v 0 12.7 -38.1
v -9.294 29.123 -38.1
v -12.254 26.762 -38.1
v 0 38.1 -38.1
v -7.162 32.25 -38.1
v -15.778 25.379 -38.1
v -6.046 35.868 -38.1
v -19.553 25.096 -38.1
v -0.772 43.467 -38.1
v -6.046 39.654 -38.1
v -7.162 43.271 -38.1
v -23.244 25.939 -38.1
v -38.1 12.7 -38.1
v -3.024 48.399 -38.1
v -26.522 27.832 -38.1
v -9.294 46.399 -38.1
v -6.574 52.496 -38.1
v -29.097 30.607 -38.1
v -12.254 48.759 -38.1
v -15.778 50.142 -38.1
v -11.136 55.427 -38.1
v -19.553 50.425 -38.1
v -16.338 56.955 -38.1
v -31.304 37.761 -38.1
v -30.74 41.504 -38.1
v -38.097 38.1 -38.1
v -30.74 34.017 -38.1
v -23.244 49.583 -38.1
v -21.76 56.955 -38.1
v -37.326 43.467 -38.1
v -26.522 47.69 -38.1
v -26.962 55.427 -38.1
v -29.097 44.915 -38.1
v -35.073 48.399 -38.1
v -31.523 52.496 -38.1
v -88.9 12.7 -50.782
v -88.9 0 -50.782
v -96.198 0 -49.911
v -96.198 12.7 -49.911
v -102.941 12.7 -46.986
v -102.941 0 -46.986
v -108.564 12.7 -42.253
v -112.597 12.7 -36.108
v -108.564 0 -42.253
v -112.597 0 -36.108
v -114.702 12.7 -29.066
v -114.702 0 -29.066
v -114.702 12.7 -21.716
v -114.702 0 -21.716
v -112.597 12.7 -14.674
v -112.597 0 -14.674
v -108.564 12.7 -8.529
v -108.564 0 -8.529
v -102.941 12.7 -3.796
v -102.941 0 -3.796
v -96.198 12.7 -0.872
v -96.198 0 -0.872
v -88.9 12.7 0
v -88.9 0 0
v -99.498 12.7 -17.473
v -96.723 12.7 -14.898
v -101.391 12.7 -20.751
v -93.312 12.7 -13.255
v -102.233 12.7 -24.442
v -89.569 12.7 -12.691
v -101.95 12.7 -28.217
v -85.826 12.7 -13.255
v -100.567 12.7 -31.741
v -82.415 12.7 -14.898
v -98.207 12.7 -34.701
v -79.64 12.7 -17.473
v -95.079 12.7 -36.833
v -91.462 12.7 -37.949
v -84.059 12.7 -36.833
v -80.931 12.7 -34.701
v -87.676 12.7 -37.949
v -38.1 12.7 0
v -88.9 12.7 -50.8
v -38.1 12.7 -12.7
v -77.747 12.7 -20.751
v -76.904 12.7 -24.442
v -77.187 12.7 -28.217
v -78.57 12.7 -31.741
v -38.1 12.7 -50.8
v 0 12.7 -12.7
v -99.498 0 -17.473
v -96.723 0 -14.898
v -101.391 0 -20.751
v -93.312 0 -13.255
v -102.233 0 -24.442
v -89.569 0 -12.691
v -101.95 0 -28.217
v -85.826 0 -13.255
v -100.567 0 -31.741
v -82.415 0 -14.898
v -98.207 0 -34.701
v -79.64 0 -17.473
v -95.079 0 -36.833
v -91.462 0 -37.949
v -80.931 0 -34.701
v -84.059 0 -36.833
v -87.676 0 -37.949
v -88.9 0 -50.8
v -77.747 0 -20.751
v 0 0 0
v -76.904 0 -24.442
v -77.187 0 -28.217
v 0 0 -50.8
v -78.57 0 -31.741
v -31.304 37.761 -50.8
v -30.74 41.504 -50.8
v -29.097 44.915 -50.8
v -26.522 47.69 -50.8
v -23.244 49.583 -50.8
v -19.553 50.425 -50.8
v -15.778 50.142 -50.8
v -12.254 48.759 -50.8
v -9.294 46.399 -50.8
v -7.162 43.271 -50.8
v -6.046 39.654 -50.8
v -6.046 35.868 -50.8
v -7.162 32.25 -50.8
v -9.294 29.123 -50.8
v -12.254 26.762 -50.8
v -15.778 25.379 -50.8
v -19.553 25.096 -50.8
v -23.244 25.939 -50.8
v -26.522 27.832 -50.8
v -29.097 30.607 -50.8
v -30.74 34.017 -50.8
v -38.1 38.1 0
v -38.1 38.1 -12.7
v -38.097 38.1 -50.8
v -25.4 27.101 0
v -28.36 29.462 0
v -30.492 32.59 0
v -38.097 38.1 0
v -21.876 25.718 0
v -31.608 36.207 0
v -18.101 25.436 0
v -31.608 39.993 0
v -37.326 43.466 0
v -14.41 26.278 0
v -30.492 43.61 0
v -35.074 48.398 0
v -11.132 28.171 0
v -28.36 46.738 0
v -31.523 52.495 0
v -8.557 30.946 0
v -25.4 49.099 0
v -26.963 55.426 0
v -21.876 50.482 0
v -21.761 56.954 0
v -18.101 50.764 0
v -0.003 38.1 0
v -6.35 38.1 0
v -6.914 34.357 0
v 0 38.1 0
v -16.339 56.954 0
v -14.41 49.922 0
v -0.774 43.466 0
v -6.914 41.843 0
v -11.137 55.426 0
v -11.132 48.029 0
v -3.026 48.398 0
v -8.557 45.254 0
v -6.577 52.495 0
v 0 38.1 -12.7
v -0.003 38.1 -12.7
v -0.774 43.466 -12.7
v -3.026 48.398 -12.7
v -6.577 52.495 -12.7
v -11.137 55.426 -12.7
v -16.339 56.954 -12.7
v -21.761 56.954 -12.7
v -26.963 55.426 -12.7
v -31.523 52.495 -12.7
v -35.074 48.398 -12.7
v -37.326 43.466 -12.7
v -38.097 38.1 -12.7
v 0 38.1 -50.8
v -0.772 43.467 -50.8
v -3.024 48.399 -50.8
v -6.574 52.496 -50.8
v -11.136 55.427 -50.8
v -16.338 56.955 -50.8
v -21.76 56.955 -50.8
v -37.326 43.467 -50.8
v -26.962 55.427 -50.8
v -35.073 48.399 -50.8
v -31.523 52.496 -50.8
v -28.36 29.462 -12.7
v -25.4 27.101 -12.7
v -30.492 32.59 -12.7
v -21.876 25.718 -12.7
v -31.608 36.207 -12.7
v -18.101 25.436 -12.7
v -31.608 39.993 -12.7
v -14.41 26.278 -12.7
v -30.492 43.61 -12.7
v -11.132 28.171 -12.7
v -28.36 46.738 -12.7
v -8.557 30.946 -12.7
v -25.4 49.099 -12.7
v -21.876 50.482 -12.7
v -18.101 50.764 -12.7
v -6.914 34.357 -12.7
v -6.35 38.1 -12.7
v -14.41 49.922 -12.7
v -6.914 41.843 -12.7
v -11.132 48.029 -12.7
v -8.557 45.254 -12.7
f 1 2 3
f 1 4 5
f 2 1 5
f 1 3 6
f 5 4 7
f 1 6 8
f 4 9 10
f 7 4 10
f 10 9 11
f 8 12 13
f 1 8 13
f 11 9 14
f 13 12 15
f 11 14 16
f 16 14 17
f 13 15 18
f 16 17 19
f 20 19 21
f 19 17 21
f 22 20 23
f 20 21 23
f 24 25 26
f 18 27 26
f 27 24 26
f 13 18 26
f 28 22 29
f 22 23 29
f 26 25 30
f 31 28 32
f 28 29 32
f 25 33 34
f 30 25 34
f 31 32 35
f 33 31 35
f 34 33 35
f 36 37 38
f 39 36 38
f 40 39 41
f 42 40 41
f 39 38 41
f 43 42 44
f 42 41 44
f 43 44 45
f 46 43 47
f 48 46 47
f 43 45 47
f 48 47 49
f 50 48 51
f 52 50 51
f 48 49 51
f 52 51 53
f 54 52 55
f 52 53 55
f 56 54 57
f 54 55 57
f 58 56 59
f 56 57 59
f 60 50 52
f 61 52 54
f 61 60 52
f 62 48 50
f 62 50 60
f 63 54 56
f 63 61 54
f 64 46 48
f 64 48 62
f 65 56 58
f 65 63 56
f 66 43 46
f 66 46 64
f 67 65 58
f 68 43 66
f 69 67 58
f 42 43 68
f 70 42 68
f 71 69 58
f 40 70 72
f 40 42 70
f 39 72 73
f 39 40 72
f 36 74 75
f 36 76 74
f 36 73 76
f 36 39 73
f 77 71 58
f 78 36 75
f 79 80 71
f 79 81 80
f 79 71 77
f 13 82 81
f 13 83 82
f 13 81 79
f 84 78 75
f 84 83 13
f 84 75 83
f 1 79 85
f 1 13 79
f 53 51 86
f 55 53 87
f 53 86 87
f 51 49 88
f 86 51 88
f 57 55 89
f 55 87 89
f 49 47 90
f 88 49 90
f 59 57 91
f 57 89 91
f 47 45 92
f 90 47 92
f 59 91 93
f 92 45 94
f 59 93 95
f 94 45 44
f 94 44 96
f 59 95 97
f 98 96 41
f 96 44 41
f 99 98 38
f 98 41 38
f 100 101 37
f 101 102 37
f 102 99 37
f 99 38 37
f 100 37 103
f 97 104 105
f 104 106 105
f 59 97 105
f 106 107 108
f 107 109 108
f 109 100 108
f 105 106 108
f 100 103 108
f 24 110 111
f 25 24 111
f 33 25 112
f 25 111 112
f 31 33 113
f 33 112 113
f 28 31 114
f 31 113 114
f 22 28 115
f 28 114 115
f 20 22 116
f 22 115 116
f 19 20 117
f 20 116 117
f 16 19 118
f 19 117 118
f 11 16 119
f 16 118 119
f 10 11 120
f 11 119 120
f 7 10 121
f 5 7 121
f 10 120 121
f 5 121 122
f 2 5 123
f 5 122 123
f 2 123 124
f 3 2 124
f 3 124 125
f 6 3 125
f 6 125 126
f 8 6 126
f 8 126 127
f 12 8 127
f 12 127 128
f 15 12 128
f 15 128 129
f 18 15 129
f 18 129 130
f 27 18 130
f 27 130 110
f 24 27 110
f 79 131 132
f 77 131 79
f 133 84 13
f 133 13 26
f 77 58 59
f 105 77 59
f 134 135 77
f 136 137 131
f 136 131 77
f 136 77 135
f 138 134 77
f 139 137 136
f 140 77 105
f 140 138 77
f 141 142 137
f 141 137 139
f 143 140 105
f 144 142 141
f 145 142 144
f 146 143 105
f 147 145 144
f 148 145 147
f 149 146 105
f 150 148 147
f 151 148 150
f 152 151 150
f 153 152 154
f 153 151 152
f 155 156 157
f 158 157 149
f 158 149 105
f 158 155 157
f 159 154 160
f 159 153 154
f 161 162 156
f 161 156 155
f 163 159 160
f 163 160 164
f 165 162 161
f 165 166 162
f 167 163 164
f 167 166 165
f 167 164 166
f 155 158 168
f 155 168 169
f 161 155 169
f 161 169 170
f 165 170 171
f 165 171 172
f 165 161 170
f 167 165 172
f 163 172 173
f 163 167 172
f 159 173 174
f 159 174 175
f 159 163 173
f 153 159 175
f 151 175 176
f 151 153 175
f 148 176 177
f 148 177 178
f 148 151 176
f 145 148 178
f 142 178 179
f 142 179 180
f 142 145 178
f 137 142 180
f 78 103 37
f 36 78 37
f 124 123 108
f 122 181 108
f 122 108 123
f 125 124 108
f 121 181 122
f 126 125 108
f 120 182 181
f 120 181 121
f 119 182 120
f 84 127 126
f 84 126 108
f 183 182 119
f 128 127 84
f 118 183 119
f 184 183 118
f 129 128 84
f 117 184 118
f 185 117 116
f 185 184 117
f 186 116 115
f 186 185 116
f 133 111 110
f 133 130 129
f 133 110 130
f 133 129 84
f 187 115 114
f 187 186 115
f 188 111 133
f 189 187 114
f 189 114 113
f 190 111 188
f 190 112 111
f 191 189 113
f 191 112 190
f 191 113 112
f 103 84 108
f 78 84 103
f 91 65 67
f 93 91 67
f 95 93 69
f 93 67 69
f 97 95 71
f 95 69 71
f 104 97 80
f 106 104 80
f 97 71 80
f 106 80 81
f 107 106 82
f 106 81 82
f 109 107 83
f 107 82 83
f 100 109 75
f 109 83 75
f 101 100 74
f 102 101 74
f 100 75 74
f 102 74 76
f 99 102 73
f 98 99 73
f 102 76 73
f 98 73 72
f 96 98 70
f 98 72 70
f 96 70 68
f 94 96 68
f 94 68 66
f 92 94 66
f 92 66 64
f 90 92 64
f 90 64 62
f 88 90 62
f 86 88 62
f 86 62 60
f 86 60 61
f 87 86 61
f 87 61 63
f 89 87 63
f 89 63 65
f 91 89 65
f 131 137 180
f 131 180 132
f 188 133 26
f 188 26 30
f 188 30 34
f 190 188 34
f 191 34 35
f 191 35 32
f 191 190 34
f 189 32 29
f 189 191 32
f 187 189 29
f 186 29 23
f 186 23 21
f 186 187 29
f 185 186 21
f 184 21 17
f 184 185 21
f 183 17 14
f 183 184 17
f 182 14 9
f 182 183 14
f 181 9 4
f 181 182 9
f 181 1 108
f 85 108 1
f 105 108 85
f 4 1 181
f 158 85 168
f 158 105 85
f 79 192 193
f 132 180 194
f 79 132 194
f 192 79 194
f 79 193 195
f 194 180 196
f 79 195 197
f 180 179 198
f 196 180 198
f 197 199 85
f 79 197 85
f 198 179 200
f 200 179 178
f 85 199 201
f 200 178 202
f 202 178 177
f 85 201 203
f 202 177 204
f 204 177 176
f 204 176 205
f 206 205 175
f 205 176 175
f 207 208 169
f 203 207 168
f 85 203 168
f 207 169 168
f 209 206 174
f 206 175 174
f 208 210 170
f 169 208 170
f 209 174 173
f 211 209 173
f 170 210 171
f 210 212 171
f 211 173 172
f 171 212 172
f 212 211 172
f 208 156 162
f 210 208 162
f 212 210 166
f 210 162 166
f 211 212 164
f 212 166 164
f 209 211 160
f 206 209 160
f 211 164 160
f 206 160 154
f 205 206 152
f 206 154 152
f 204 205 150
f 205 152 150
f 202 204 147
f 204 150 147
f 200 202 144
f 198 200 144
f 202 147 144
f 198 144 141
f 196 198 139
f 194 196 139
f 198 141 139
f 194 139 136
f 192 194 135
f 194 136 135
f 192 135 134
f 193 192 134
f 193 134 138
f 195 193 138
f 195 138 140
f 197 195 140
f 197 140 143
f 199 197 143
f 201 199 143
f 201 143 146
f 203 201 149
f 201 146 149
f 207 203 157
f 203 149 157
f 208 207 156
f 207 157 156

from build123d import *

# Parameters (mm, degrees)
SALIENTE_EXTRUIR2_DEPTH = 12.7
SALIENTE_EXTRUIR4_DEPTH = 12.7
CROQUIS7_R              = 12.7
CORTAR_EXTRUIR1_DEPTH   = 12.7
SALIENTE_EXTRUIR5_DEPTH = 12.7
CROQUIS9_R              = 12.7
CORTAR_EXTRUIR2_DEPTH   = 28.702
CROQUIS10_R             = 12.7
CORTAR_EXTRUIR3_DEPTH   = 32.004


with BuildPart() as part:
    # Croquis1 → Saliente-Extruir2 (new body)
    with BuildSketch(Plane(origin=(0, 0, 0), x_dir=(1, 0, 0), z_dir=(0, 1, 0))):
        with BuildLine():
            Line((0, 0), (0, 50.8))
            Line((0, 50.8), (-88.9, 50.8))
            Line((-88.9, 50.8), (-88.9, 50.782381867))
            ThreePointArc((-88.9, 50.782381867), (-114.968896843, 25.391190933), (-88.9, 0))
            Line((-88.9, 0), (0, 0))
        make_face()
    extrude(amount=SALIENTE_EXTRUIR2_DEPTH)

    # Croquis5 → Saliente-Extruir4 (add)
    with BuildSketch(Plane.XY):
        with BuildLine():
            Line((0, 12.7), (0, 38.1))
            Line((0, 38.1), (-0.002616662, 38.1))
            ThreePointArc((-0.002616662, 38.1), (-19.05, 57.147383338), (-38.097383338, 38.1))
            Line((-38.097383338, 38.1), (-38.1, 38.1))
            Line((-38.1, 38.1), (-38.1, 12.7))
            Line((-38.1, 12.7), (0, 12.7))
        make_face()
    extrude(amount=-SALIENTE_EXTRUIR4_DEPTH)

    # Croquis7 → Cortar-Extruir1 (cut)
    with BuildSketch(Plane.XY):
        with Locations((-19.05, 38.1)):
            Circle(CROQUIS7_R)
    extrude(amount=-CORTAR_EXTRUIR1_DEPTH, mode=Mode.SUBTRACT)

    # Croquis8 → Saliente-Extruir5 (add)
    with BuildSketch(Plane(origin=(0, 0, -50.8), x_dir=(-1, 0, 0), z_dir=(0, 0, -1))):
        with BuildLine():
            Line((38.1, 12.7), (38.097383338, 38.1))
            ThreePointArc((38.097383338, 38.1), (19.048691669, 57.148691669), (0, 38.1))
            Line((0, 38.1), (0, 12.7))
            Line((0, 12.7), (38.1, 12.7))
        make_face()
    extrude(amount=-SALIENTE_EXTRUIR5_DEPTH)

    # Croquis9 → Cortar-Extruir2 (cut)
    with BuildSketch(Plane(origin=(0, 0, -50.8), x_dir=(-1, 0, 0), z_dir=(0, 0, -1))):
        with Locations((18.60399445, 37.760816035)):
            Circle(CROQUIS9_R)
    extrude(amount=-CORTAR_EXTRUIR2_DEPTH, mode=Mode.SUBTRACT)

    # Croquis10 → Cortar-Extruir3 (cut)
    with BuildSketch(Plane(origin=(0, 12.7, 0), x_dir=(1, 0, 0), z_dir=(0, 1, 0))):
        with Locations(Location((-89.568896843, 25.391190933, 0), (0, 0, 270))):
            Circle(CROQUIS10_R)
    extrude(amount=-CORTAR_EXTRUIR3_DEPTH, mode=Mode.SUBTRACT)


solid = part.part
